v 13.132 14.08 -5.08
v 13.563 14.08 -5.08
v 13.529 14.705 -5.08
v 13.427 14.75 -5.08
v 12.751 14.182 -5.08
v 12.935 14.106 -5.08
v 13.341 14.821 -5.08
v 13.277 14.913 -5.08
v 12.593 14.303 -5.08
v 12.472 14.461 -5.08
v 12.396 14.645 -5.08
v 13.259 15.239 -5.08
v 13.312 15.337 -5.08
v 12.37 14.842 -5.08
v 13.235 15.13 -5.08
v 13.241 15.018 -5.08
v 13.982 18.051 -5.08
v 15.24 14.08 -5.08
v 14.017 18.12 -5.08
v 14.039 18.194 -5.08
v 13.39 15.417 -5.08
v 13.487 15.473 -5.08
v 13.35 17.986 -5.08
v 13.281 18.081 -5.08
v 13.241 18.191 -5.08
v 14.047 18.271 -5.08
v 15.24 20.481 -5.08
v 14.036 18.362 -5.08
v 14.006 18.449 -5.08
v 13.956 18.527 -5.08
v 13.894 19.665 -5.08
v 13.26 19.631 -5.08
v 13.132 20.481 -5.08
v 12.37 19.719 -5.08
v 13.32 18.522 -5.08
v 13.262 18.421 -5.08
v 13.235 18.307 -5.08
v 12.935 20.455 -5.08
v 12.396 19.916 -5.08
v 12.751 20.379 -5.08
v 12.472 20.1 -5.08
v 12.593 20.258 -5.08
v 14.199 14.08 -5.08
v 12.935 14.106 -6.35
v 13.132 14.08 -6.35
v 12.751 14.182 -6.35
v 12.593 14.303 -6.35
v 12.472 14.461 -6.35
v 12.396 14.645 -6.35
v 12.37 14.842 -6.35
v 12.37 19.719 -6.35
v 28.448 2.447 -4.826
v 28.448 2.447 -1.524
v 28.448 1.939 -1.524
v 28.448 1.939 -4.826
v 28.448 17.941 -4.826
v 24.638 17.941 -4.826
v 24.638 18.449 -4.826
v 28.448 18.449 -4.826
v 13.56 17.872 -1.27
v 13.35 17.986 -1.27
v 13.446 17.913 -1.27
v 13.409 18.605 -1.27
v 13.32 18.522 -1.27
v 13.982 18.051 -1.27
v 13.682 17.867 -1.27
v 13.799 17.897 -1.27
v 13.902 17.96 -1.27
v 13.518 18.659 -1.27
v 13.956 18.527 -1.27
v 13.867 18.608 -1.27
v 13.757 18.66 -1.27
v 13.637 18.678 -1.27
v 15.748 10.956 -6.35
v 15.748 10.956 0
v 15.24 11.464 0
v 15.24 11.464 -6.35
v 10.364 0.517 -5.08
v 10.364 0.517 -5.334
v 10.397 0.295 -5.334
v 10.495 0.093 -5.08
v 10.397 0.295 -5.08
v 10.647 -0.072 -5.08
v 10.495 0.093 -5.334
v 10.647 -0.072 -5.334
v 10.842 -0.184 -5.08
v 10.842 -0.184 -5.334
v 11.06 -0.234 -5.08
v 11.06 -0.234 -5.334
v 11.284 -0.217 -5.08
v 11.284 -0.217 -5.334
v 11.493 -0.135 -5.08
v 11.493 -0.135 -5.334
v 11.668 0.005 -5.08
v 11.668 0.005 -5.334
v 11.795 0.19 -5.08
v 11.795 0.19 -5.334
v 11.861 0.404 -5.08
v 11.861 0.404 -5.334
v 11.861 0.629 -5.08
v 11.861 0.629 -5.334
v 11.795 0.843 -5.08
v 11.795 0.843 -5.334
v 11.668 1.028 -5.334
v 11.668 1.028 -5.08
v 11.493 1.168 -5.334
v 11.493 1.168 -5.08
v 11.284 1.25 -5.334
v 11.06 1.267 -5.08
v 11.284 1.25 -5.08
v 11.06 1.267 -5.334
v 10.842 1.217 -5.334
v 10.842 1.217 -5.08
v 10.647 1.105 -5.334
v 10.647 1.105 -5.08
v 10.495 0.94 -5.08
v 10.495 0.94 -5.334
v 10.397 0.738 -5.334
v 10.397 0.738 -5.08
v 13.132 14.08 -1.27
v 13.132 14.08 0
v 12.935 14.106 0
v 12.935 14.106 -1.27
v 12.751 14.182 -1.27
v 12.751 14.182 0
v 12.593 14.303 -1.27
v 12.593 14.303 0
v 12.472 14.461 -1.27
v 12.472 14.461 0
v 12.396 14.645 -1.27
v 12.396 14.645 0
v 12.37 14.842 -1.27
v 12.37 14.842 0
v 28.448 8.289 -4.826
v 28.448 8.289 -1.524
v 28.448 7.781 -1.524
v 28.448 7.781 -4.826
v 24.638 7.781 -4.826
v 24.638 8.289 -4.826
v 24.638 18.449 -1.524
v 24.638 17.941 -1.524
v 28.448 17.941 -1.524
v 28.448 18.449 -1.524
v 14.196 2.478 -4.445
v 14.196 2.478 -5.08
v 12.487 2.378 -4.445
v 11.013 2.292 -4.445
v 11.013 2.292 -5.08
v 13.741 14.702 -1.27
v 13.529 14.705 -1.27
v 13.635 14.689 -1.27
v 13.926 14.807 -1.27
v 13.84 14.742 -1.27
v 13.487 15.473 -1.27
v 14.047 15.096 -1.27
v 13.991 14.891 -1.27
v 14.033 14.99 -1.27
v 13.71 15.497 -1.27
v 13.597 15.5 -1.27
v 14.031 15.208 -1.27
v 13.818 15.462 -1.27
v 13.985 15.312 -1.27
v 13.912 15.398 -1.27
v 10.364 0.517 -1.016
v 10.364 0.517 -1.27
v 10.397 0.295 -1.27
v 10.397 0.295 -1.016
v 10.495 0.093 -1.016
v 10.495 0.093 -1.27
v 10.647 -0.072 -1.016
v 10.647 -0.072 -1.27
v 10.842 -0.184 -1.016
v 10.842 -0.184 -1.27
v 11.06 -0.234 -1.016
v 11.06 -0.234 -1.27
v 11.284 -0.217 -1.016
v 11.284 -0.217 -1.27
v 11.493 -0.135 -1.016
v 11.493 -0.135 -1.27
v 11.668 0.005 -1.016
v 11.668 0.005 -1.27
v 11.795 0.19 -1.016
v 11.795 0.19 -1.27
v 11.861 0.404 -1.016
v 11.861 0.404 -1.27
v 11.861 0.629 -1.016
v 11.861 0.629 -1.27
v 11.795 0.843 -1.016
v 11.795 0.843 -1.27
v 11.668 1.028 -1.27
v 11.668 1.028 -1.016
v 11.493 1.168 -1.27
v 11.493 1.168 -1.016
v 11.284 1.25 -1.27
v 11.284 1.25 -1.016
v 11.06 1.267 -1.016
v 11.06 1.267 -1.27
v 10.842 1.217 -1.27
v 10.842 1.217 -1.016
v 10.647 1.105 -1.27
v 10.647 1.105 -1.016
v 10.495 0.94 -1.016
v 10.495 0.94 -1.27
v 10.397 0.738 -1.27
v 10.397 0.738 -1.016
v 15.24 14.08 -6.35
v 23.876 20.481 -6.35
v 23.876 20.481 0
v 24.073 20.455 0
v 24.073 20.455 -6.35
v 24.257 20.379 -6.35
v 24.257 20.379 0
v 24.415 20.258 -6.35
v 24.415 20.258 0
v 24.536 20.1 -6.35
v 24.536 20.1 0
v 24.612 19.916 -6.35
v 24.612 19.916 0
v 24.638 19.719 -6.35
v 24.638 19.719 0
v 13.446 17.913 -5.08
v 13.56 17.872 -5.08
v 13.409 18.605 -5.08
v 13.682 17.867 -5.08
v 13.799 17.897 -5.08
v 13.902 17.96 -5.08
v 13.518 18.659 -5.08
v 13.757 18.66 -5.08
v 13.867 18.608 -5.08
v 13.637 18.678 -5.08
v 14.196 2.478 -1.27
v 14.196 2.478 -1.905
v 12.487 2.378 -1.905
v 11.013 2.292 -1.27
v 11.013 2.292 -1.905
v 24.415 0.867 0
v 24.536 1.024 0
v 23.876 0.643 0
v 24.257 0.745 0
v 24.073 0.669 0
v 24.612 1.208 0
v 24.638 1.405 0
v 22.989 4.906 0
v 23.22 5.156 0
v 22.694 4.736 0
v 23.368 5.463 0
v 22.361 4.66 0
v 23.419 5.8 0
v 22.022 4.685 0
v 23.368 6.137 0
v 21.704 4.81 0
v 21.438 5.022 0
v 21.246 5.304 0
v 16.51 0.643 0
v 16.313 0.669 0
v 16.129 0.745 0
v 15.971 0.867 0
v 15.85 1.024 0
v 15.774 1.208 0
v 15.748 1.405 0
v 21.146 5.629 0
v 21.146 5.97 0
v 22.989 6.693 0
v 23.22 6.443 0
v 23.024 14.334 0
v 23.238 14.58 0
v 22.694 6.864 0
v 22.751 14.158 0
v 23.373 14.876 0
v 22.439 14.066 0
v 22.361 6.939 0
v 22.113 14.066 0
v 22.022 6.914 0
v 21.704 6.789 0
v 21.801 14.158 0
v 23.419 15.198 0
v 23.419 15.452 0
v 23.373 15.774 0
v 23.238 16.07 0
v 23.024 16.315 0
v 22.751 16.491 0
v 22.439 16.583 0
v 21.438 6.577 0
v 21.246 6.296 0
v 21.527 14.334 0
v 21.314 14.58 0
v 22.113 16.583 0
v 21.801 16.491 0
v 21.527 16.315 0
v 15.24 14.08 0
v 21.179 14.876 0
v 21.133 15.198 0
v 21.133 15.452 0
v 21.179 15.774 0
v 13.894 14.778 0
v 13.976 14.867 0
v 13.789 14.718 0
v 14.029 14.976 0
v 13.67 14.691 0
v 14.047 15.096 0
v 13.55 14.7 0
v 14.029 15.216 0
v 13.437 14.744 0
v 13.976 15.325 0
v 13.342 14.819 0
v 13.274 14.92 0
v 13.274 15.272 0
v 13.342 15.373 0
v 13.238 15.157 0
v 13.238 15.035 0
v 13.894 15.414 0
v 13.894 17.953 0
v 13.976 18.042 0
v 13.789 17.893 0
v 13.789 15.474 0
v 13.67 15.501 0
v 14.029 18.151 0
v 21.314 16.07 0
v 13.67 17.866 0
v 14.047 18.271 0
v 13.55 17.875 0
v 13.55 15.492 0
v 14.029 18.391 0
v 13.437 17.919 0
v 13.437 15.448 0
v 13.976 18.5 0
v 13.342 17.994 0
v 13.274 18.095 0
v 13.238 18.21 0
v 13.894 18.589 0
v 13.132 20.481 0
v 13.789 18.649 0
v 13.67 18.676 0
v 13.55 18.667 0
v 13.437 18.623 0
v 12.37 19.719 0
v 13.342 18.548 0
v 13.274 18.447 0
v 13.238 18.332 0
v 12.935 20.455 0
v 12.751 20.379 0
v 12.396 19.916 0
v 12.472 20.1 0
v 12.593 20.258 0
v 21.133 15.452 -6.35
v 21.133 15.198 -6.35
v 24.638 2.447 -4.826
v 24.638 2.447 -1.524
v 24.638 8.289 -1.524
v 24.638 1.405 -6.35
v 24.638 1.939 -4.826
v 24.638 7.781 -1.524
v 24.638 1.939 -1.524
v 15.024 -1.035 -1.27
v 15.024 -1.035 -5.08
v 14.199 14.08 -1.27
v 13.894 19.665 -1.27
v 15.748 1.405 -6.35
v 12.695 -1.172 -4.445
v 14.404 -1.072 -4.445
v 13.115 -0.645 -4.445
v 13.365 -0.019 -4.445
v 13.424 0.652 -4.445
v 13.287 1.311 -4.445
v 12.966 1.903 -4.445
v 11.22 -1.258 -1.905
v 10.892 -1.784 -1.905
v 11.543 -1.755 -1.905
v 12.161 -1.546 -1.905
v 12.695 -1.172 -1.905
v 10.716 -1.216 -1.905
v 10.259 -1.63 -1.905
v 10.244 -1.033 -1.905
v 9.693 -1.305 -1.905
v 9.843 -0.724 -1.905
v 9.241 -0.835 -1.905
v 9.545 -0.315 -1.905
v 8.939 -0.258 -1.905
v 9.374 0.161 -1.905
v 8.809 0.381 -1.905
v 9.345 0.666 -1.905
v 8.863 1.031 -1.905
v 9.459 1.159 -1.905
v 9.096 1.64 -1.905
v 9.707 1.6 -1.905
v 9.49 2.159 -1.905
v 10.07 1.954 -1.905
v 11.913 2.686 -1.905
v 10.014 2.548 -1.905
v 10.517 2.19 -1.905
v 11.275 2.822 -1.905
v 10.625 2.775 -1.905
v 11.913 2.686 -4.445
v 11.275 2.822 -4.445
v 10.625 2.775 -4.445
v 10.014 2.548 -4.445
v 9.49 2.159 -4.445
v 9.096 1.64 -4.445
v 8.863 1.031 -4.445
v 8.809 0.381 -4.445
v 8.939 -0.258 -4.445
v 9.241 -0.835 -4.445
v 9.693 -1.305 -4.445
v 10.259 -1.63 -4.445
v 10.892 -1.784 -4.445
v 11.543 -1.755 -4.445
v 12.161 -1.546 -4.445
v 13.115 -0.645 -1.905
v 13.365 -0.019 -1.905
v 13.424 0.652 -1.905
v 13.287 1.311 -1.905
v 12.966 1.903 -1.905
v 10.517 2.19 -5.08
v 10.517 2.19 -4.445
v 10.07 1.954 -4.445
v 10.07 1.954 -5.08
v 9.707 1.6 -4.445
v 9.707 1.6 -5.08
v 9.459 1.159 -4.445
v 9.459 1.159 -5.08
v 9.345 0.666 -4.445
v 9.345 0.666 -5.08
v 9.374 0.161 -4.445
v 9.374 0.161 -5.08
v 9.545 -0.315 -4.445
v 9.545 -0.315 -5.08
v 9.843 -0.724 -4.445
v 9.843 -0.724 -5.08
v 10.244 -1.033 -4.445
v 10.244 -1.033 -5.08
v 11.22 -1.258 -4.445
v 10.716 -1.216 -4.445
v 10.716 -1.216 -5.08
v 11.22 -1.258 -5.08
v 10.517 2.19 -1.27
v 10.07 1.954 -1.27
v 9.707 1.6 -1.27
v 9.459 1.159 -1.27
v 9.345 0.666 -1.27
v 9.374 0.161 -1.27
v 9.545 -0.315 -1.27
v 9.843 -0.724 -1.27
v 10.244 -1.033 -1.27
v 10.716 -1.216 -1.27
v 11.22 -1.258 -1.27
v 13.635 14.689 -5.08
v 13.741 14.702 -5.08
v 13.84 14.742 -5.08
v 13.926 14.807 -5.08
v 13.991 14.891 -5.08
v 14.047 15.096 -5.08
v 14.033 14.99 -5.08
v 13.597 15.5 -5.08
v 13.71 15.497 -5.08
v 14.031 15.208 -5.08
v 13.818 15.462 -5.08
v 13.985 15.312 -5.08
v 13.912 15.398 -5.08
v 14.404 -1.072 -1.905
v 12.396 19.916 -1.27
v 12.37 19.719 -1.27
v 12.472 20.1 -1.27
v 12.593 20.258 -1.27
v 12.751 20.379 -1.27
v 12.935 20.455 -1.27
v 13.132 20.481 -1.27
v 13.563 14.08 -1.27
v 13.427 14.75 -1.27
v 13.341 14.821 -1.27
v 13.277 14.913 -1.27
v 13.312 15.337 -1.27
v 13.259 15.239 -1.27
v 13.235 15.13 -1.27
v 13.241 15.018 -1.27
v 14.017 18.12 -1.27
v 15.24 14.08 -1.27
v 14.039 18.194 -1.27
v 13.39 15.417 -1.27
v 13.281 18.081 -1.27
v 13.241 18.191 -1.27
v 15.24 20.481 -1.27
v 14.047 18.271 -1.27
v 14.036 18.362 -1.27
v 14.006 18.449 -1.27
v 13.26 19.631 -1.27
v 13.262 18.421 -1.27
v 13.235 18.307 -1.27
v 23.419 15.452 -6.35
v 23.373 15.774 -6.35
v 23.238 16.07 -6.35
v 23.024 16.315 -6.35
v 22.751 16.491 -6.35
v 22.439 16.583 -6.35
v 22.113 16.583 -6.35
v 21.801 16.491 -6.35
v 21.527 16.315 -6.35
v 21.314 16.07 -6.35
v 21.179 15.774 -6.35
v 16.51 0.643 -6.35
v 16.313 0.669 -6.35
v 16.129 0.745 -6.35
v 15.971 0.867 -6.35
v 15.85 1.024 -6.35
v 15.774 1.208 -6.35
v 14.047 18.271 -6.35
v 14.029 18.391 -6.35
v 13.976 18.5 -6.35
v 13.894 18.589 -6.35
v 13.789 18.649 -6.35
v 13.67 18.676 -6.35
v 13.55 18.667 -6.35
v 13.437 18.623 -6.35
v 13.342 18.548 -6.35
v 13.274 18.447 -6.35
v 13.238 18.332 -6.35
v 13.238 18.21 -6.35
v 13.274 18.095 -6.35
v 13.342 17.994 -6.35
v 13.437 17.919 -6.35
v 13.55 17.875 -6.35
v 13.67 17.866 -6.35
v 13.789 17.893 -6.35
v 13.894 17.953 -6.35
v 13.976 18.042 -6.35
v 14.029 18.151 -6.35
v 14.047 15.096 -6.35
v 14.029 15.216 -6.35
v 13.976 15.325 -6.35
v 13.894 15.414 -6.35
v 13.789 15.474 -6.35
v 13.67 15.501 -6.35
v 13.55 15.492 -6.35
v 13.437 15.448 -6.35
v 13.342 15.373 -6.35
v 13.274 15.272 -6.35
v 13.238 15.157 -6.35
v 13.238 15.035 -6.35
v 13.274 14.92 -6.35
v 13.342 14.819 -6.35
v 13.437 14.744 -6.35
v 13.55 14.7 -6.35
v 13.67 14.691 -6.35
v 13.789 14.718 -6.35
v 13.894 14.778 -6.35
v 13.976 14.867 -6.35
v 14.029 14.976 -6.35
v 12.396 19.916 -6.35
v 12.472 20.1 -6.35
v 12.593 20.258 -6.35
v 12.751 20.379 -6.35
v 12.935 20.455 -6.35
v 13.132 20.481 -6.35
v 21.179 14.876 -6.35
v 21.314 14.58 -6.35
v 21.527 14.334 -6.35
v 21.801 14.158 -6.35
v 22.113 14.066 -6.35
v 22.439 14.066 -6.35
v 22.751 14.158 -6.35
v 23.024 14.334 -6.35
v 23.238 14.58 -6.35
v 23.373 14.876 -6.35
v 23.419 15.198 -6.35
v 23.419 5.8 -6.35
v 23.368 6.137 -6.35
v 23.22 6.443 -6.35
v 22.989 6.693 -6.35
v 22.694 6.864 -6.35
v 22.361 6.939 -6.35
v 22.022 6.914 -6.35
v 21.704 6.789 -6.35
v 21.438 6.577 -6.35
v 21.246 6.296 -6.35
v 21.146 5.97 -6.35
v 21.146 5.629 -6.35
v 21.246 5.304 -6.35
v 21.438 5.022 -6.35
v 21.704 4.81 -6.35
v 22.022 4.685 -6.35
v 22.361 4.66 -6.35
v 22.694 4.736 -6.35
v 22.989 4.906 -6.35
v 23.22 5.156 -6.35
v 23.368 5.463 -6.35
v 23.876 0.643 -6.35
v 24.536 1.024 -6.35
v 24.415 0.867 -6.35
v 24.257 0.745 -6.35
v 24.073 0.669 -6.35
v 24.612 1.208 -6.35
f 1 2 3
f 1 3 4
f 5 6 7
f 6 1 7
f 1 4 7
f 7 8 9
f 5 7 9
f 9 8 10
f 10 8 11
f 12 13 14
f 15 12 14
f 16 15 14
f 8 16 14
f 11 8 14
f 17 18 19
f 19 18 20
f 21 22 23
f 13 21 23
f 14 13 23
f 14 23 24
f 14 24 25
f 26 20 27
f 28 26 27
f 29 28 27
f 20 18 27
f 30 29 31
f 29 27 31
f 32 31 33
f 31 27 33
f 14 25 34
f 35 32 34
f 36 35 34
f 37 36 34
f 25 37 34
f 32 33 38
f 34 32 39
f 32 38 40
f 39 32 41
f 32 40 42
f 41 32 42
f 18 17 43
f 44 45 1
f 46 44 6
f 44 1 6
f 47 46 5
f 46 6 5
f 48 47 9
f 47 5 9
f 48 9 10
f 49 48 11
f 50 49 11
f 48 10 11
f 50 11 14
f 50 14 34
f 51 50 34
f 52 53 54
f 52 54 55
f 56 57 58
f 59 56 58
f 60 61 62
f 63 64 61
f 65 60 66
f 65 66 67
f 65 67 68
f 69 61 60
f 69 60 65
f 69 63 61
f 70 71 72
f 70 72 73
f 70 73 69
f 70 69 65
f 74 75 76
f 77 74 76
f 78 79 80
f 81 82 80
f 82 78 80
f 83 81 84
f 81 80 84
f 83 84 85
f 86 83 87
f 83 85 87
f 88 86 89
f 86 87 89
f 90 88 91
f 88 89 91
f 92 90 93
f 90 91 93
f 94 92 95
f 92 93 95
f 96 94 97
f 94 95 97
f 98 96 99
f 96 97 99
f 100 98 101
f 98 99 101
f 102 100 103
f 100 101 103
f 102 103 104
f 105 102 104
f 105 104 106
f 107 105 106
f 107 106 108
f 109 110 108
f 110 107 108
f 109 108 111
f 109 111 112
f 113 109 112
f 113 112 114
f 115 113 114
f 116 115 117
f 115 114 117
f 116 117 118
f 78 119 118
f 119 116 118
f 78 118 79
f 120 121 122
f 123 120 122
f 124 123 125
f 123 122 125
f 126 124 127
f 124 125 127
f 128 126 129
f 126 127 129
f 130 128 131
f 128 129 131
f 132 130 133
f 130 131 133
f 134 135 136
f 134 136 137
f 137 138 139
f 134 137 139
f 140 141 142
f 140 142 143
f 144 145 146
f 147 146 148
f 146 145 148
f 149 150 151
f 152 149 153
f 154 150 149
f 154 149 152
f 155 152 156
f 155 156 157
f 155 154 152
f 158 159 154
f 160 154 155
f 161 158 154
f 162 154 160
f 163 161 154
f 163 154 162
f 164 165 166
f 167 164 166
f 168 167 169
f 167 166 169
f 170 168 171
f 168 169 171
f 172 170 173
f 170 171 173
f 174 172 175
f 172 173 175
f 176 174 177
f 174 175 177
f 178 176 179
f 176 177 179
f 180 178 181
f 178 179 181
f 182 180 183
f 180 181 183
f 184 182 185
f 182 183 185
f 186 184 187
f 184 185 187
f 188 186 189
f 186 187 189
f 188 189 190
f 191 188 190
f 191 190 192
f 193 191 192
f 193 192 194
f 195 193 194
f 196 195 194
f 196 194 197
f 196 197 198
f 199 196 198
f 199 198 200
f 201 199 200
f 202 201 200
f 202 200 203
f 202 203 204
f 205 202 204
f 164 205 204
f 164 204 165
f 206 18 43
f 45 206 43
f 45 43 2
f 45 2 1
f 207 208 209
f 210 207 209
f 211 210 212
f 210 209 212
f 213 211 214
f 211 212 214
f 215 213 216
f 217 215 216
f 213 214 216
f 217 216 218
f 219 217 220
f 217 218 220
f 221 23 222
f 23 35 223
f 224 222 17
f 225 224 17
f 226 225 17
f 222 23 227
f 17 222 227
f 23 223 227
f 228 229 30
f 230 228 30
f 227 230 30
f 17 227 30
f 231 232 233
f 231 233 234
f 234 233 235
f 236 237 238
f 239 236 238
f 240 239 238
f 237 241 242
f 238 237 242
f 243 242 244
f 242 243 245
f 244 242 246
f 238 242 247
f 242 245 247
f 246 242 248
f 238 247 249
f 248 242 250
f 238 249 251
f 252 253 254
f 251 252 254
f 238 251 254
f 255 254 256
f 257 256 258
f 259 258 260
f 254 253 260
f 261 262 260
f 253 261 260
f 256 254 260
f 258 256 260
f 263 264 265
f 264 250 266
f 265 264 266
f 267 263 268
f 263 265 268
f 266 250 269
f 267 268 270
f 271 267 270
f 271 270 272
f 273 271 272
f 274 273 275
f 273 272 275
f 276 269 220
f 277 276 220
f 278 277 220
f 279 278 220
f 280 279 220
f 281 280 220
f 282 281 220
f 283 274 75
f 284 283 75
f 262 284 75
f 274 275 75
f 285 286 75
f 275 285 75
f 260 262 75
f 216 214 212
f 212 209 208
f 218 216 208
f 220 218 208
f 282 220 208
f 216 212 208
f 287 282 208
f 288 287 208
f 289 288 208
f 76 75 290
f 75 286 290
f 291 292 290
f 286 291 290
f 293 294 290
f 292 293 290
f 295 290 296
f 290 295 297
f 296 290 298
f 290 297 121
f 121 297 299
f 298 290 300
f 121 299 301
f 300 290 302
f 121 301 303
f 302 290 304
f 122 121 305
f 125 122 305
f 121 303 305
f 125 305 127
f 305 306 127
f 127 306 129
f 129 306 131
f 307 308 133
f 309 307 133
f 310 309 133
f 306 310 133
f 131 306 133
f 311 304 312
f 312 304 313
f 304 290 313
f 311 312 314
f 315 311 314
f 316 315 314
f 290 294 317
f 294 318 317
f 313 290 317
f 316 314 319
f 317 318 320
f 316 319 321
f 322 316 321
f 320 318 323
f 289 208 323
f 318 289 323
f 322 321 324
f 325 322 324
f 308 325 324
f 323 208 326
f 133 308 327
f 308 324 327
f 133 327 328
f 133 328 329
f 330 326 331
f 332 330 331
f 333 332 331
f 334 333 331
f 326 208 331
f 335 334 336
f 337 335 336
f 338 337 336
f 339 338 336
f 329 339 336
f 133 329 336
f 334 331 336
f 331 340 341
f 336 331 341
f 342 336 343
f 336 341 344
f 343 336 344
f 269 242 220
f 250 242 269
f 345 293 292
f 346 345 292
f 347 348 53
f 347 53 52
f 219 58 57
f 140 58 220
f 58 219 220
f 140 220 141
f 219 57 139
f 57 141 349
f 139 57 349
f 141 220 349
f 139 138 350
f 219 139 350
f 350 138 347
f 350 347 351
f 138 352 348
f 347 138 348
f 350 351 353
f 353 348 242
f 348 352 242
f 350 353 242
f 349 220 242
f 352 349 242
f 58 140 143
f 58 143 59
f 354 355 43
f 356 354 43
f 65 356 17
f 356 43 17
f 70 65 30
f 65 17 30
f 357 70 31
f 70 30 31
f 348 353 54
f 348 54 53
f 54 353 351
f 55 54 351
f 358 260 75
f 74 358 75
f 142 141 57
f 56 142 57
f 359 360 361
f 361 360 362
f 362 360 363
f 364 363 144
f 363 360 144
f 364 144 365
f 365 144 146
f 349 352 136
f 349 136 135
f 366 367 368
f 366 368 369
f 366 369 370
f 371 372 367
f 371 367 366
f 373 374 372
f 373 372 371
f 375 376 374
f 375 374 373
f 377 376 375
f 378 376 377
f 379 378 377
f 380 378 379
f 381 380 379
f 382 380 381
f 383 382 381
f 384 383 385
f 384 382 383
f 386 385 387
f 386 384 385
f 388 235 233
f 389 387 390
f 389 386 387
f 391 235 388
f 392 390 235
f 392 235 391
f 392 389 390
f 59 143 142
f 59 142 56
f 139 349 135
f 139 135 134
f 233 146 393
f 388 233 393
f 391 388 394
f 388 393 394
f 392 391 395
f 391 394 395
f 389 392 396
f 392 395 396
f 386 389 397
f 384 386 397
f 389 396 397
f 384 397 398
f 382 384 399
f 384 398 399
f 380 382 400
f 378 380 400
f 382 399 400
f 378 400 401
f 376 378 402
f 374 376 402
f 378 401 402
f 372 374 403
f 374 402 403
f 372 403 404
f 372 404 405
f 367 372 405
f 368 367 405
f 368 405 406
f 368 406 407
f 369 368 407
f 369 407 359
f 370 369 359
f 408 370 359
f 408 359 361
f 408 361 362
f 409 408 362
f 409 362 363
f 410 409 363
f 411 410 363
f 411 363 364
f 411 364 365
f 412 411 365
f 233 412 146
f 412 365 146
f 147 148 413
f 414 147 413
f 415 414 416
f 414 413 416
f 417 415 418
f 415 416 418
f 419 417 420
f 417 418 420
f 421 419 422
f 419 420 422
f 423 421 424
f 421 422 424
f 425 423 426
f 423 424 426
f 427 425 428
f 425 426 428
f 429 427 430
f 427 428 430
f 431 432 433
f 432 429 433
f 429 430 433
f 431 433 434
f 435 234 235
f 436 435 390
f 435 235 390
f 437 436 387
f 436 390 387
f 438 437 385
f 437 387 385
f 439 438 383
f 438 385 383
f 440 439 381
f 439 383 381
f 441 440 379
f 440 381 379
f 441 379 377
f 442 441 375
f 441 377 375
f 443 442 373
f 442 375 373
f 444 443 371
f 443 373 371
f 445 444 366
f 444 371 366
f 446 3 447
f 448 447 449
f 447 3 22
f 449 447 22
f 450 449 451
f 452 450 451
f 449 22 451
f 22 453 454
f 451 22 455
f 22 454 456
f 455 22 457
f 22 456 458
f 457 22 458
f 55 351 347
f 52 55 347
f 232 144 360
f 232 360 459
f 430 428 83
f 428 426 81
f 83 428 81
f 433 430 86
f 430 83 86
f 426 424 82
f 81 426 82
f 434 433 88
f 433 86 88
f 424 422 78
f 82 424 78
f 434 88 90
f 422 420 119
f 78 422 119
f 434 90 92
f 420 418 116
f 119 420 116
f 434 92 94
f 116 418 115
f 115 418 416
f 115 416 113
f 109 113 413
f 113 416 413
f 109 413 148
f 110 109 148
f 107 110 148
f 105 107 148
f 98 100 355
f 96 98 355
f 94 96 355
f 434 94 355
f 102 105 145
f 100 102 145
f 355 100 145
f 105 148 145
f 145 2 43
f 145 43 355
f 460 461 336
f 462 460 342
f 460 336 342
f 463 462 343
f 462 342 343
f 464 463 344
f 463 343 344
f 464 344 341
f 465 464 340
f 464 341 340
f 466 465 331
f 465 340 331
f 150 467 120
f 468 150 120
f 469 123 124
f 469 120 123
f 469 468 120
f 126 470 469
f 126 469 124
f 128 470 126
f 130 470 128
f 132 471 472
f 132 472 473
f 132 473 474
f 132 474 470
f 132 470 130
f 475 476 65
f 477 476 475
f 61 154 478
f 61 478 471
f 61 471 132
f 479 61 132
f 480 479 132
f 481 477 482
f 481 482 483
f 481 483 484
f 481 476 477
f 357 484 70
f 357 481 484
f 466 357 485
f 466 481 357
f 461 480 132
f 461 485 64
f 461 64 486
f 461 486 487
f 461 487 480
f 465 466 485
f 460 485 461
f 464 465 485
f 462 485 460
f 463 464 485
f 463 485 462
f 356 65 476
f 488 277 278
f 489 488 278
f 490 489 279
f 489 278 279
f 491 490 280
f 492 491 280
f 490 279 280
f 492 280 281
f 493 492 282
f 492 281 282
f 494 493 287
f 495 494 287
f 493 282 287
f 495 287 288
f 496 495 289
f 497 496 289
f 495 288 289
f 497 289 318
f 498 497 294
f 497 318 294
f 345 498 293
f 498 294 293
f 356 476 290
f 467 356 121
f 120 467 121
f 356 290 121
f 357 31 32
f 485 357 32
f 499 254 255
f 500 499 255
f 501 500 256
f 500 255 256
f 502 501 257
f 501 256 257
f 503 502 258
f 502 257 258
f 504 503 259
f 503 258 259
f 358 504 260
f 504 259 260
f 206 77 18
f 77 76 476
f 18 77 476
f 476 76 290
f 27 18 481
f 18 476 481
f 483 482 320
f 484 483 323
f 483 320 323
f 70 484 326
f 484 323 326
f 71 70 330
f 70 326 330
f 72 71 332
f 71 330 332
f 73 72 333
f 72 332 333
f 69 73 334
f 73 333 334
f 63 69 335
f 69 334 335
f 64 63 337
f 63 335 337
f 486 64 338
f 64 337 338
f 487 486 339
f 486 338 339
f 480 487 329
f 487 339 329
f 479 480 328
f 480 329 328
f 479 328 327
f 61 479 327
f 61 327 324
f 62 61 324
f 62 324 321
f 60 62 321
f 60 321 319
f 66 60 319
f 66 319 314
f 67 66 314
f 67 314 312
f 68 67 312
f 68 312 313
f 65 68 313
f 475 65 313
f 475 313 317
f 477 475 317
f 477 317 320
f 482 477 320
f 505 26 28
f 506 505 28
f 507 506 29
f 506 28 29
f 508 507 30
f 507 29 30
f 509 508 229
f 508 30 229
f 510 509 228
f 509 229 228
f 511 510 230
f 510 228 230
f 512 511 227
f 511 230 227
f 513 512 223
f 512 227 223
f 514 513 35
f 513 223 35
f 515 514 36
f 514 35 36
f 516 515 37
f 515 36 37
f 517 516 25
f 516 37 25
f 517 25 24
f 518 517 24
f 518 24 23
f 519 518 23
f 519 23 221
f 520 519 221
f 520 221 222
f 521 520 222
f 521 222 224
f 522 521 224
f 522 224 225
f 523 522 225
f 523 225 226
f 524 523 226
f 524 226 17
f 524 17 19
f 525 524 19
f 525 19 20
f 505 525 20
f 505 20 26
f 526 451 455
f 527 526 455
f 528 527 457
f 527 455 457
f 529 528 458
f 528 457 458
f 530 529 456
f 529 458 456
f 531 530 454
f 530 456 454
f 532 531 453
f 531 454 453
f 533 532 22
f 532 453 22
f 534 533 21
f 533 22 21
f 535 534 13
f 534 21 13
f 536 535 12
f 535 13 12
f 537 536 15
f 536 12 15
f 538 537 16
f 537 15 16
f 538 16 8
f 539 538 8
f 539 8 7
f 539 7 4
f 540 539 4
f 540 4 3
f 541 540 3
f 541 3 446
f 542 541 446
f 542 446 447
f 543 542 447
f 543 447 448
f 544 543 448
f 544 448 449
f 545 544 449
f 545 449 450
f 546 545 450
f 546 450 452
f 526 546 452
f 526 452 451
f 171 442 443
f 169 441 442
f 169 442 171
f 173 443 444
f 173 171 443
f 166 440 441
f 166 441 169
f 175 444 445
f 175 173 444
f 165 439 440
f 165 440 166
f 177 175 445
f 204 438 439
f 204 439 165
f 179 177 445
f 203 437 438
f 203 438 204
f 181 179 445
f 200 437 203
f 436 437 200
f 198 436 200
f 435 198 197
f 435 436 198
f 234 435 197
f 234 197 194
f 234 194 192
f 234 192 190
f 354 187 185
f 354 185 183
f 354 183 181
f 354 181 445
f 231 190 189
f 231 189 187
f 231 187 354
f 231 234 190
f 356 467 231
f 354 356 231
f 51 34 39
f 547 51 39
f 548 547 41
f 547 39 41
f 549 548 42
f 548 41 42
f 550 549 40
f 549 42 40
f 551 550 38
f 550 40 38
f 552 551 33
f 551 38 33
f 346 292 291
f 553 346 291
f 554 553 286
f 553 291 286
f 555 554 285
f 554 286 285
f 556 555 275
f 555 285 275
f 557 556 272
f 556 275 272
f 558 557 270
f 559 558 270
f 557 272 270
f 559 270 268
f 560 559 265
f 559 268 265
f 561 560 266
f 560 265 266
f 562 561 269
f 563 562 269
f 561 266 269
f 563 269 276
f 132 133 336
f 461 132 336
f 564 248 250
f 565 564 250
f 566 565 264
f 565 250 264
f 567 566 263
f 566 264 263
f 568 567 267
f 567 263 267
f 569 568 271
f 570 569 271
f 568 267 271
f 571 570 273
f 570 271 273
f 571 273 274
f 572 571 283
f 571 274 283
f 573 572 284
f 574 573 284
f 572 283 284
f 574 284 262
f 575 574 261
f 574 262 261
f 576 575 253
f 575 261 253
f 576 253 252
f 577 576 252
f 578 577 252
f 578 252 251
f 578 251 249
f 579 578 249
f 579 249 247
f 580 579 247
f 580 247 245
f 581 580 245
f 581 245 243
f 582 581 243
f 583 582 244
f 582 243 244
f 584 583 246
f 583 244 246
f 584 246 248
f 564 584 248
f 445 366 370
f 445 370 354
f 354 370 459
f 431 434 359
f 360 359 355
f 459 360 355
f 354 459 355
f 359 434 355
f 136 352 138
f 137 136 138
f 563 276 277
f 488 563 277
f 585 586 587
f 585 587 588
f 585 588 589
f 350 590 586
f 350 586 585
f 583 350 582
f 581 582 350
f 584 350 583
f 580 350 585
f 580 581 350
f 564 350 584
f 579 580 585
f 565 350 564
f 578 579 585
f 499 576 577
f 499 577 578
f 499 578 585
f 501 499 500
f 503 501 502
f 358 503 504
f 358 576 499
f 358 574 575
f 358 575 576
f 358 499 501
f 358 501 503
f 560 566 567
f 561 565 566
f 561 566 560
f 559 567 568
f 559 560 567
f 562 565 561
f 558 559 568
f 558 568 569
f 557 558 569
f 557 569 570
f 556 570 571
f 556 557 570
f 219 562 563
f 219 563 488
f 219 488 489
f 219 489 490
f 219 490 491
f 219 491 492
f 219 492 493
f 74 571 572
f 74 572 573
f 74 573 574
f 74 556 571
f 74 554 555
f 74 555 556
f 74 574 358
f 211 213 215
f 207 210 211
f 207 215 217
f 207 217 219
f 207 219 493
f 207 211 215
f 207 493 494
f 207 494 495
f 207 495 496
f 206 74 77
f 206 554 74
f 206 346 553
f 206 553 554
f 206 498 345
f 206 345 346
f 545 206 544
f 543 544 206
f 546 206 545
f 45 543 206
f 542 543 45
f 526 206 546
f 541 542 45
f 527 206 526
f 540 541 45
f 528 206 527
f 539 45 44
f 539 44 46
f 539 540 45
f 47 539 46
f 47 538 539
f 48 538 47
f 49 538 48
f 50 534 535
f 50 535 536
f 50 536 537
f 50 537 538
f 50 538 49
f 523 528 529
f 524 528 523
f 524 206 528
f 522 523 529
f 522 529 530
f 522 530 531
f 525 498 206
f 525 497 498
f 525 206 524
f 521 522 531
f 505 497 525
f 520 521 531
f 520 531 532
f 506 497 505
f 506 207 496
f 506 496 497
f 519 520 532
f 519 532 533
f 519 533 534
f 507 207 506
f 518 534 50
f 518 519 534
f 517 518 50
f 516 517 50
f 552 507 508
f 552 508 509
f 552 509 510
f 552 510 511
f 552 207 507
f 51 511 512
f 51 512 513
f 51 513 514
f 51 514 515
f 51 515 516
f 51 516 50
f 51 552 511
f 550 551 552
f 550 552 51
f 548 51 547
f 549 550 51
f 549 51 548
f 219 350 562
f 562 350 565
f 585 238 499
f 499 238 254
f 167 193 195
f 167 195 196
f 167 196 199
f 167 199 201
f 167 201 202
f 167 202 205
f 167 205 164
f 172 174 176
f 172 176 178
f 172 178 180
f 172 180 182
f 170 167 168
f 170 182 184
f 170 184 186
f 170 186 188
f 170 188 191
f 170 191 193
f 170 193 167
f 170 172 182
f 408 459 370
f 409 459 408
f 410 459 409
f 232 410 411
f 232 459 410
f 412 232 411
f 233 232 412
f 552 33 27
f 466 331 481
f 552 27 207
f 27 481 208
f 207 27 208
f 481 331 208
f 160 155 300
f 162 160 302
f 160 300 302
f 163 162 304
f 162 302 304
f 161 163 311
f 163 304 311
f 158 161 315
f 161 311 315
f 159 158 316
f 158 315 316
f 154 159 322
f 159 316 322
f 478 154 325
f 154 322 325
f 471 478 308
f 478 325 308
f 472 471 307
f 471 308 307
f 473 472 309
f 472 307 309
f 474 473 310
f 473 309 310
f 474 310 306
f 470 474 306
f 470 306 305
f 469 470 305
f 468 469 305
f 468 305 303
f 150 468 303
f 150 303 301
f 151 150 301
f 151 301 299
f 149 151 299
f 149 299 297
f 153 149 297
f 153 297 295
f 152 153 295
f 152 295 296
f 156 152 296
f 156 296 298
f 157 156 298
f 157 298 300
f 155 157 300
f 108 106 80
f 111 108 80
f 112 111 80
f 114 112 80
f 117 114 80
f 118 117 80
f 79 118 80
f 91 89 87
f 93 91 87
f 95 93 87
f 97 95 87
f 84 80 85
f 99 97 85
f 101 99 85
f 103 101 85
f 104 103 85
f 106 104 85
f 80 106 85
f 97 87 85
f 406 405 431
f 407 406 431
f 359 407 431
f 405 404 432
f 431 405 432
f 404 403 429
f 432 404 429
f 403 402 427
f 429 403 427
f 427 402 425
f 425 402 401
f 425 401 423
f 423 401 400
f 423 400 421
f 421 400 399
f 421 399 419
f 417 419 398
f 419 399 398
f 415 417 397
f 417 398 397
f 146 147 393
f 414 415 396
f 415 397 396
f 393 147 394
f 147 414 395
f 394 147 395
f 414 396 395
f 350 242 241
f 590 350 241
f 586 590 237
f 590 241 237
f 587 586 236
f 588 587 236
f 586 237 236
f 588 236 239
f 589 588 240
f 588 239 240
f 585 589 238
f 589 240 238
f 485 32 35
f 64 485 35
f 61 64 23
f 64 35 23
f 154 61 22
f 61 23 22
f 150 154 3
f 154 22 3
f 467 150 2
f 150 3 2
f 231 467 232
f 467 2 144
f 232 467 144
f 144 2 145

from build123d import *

# Parameters (mm, degrees)
SKETCH1_R                = 0.406598389
SKETCH1_R_2              = 1.143
BASE_EXTRUDE_DEPTH       = 6.35
SKETCH2_W                = 2.8702
SKETCH2_H                = 3.81
CUT_EXTRUDE1_DEPTH       = 33.262756347
SKETCH3_W                = 3.302
SKETCH3_H                = 0.508
BOSS_EXTRUDE1_DEPTH      = 3.81
BOSS_EXTRUDE2_DEPTH      = 3.81
SKETCH5_W                = 6.170551723
SKETCH5_H                = 2.54
CUT_EXTRUDE2_DEPTH       = 6.096
SKETCH6_R                = 2.3114
BOSS_EXTRUDE3_DEPTH      = 2.54
BOSS_EXTRUDE4_DEPTH      = 0.254
BOSS_EXTRUDE4_DEPTH_BACK = 4.064
SKETCH7_R                = 0.752584906


with BuildPart() as part:
    # Sketch1 → Base-Extrude (new body)
    with BuildSketch(Plane.XY):
        with BuildLine():
            Line((15.748192067, 1.405399301), (15.748192067, 10.955799301))
            Line((15.748192067, 10.955799301), (15.240192067, 11.463799301))
            Line((15.240192067, 11.463799301), (15.240192067, 14.079999301))
            Line((15.240192067, 14.079999301), (13.131992067, 14.079999301))
            ThreePointArc((13.131992067, 14.079999301), (12.5931767, 14.303183934), (12.369992067, 14.841999301))
            Line((12.369992067, 14.841999301), (12.369992067, 19.718799301))
            ThreePointArc((12.369992067, 19.718799301), (12.5931767, 20.257614668), (13.131992067, 20.480799301))
            Line((13.131992067, 20.480799301), (23.876192067, 20.480799301))
            ThreePointArc((23.876192067, 20.480799301), (24.415007435, 20.257614668), (24.638192067, 19.718799301))
            Line((24.638192067, 19.718799301), (24.638192067, 1.405399301))
            ThreePointArc((24.638192067, 1.405399301), (24.415007435, 0.866583934), (23.876192067, 0.643399301))
            Line((23.876192067, 0.643399301), (16.510192067, 0.643399301))
            ThreePointArc((16.510192067, 0.643399301), (15.9713767, 0.866583934), (15.748192067, 1.405399301))
        make_face()
        with Locations((13.639992067, 18.270999301)):
            Circle(SKETCH1_R, mode=Mode.SUBTRACT)
        with Locations((13.639992067, 15.095999301)):
            Circle(SKETCH1_R, mode=Mode.SUBTRACT)
        with Locations((22.275992067, 5.799599301)):
            Circle(SKETCH1_R_2, mode=Mode.SUBTRACT)
        with BuildLine():
            Line((23.418992067, 15.197599301), (23.418992067, 15.451599301))
            ThreePointArc((23.418992067, 15.451599301), (22.275992067, 16.594599301), (21.132992067, 15.451599301))
            Line((21.132992067, 15.451599301), (21.132992067, 15.197599301))
            ThreePointArc((21.132992067, 15.197599301), (22.275992067, 14.054599301), (23.418992067, 15.197599301))
        make_face(mode=Mode.SUBTRACT)
    extrude(amount=-BASE_EXTRUDE_DEPTH)

    # Sketch2 → Cut-Extrude1 (cut, through all)
    with BuildSketch(Plane(origin=(0, 20.480799301, 0), x_dir=(-1, 0, 0), z_dir=(0, 1, 0))):
        with Locations((-13.805092067, -3.175)):
            Rectangle(SKETCH2_W, SKETCH2_H)
    extrude(amount=-CUT_EXTRUDE1_DEPTH, mode=Mode.SUBTRACT)

    # Sketch3 → Boss-Extrude1 (add)
    with BuildSketch(Plane(origin=(24.638192067, 0, 0), x_dir=(0, 0, -1), z_dir=(1, 0, 0))):
        with Locations((3.175, 18.194799301)):
            Rectangle(SKETCH3_W, SKETCH3_H)
        with Locations((3.175, 8.034799301)):
            Rectangle(SKETCH3_W, SKETCH3_H)
        with Locations((3.175, 2.192799301)):
            Rectangle(SKETCH3_W, SKETCH3_H)
    extrude(amount=BOSS_EXTRUDE1_DEPTH)

    # Sketch4 → Boss-Extrude2 (add)
    with BuildSketch(Plane.XY.offset(-5.08)):
        with BuildLine():
            Line((13.259938371, 19.630855819), (14.196083485, 2.477721783))
            Line((14.196083485, 2.477721783), (11.012636903, 2.291505495))
            ThreePointArc((11.012636903, 2.291505495), (9.341497952, 0.412712637), (11.22029081, -1.258426314))
            Line((11.22029081, -1.258426314), (15.023756731, -1.035345448))
            Line((15.023756731, -1.035345448), (13.893994801, 19.665459923))
            Line((13.893994801, 19.665459923), (13.259938371, 19.630855819))
        make_face()
    extrude(amount=BOSS_EXTRUDE2_DEPTH)

    # Sketch5 → Cut-Extrude2 (cut)
    with BuildSketch(Plane(origin=(-0.096031652, 1.641701906, 0), x_dir=(-0.9982935348358413, -0.05839536201584024, 0), z_dir=(-0.05839536201584024, 0.9982935348358413, 0))):
        with Locations((-11.231269963, -3.175)):
            Rectangle(SKETCH5_W, SKETCH5_H)
    extrude(amount=-CUT_EXTRUDE2_DEPTH, mode=Mode.SUBTRACT)

    # Sketch6 → Boss-Extrude3 (add)
    with BuildSketch(Plane.XY.offset(-4.445)):
        with Locations(Location((11.116463856, 0.51653959, 0), (0, 0, 53.632575023))):
            Circle(SKETCH6_R)
    extrude(amount=BOSS_EXTRUDE3_DEPTH)

    # Sketch7 → Boss-Extrude4 (add, two sides: drawn at the far end of the back side and taken through both)
    with BuildSketch(Plane.XY.offset(-1.27).offset(-BOSS_EXTRUDE4_DEPTH_BACK)):
        with Locations(Location((11.116463856, 0.51653959, 0), (0, 0, 180))):
            Circle(SKETCH7_R)
    extrude(amount=BOSS_EXTRUDE4_DEPTH + BOSS_EXTRUDE4_DEPTH_BACK)


solid = part.part
